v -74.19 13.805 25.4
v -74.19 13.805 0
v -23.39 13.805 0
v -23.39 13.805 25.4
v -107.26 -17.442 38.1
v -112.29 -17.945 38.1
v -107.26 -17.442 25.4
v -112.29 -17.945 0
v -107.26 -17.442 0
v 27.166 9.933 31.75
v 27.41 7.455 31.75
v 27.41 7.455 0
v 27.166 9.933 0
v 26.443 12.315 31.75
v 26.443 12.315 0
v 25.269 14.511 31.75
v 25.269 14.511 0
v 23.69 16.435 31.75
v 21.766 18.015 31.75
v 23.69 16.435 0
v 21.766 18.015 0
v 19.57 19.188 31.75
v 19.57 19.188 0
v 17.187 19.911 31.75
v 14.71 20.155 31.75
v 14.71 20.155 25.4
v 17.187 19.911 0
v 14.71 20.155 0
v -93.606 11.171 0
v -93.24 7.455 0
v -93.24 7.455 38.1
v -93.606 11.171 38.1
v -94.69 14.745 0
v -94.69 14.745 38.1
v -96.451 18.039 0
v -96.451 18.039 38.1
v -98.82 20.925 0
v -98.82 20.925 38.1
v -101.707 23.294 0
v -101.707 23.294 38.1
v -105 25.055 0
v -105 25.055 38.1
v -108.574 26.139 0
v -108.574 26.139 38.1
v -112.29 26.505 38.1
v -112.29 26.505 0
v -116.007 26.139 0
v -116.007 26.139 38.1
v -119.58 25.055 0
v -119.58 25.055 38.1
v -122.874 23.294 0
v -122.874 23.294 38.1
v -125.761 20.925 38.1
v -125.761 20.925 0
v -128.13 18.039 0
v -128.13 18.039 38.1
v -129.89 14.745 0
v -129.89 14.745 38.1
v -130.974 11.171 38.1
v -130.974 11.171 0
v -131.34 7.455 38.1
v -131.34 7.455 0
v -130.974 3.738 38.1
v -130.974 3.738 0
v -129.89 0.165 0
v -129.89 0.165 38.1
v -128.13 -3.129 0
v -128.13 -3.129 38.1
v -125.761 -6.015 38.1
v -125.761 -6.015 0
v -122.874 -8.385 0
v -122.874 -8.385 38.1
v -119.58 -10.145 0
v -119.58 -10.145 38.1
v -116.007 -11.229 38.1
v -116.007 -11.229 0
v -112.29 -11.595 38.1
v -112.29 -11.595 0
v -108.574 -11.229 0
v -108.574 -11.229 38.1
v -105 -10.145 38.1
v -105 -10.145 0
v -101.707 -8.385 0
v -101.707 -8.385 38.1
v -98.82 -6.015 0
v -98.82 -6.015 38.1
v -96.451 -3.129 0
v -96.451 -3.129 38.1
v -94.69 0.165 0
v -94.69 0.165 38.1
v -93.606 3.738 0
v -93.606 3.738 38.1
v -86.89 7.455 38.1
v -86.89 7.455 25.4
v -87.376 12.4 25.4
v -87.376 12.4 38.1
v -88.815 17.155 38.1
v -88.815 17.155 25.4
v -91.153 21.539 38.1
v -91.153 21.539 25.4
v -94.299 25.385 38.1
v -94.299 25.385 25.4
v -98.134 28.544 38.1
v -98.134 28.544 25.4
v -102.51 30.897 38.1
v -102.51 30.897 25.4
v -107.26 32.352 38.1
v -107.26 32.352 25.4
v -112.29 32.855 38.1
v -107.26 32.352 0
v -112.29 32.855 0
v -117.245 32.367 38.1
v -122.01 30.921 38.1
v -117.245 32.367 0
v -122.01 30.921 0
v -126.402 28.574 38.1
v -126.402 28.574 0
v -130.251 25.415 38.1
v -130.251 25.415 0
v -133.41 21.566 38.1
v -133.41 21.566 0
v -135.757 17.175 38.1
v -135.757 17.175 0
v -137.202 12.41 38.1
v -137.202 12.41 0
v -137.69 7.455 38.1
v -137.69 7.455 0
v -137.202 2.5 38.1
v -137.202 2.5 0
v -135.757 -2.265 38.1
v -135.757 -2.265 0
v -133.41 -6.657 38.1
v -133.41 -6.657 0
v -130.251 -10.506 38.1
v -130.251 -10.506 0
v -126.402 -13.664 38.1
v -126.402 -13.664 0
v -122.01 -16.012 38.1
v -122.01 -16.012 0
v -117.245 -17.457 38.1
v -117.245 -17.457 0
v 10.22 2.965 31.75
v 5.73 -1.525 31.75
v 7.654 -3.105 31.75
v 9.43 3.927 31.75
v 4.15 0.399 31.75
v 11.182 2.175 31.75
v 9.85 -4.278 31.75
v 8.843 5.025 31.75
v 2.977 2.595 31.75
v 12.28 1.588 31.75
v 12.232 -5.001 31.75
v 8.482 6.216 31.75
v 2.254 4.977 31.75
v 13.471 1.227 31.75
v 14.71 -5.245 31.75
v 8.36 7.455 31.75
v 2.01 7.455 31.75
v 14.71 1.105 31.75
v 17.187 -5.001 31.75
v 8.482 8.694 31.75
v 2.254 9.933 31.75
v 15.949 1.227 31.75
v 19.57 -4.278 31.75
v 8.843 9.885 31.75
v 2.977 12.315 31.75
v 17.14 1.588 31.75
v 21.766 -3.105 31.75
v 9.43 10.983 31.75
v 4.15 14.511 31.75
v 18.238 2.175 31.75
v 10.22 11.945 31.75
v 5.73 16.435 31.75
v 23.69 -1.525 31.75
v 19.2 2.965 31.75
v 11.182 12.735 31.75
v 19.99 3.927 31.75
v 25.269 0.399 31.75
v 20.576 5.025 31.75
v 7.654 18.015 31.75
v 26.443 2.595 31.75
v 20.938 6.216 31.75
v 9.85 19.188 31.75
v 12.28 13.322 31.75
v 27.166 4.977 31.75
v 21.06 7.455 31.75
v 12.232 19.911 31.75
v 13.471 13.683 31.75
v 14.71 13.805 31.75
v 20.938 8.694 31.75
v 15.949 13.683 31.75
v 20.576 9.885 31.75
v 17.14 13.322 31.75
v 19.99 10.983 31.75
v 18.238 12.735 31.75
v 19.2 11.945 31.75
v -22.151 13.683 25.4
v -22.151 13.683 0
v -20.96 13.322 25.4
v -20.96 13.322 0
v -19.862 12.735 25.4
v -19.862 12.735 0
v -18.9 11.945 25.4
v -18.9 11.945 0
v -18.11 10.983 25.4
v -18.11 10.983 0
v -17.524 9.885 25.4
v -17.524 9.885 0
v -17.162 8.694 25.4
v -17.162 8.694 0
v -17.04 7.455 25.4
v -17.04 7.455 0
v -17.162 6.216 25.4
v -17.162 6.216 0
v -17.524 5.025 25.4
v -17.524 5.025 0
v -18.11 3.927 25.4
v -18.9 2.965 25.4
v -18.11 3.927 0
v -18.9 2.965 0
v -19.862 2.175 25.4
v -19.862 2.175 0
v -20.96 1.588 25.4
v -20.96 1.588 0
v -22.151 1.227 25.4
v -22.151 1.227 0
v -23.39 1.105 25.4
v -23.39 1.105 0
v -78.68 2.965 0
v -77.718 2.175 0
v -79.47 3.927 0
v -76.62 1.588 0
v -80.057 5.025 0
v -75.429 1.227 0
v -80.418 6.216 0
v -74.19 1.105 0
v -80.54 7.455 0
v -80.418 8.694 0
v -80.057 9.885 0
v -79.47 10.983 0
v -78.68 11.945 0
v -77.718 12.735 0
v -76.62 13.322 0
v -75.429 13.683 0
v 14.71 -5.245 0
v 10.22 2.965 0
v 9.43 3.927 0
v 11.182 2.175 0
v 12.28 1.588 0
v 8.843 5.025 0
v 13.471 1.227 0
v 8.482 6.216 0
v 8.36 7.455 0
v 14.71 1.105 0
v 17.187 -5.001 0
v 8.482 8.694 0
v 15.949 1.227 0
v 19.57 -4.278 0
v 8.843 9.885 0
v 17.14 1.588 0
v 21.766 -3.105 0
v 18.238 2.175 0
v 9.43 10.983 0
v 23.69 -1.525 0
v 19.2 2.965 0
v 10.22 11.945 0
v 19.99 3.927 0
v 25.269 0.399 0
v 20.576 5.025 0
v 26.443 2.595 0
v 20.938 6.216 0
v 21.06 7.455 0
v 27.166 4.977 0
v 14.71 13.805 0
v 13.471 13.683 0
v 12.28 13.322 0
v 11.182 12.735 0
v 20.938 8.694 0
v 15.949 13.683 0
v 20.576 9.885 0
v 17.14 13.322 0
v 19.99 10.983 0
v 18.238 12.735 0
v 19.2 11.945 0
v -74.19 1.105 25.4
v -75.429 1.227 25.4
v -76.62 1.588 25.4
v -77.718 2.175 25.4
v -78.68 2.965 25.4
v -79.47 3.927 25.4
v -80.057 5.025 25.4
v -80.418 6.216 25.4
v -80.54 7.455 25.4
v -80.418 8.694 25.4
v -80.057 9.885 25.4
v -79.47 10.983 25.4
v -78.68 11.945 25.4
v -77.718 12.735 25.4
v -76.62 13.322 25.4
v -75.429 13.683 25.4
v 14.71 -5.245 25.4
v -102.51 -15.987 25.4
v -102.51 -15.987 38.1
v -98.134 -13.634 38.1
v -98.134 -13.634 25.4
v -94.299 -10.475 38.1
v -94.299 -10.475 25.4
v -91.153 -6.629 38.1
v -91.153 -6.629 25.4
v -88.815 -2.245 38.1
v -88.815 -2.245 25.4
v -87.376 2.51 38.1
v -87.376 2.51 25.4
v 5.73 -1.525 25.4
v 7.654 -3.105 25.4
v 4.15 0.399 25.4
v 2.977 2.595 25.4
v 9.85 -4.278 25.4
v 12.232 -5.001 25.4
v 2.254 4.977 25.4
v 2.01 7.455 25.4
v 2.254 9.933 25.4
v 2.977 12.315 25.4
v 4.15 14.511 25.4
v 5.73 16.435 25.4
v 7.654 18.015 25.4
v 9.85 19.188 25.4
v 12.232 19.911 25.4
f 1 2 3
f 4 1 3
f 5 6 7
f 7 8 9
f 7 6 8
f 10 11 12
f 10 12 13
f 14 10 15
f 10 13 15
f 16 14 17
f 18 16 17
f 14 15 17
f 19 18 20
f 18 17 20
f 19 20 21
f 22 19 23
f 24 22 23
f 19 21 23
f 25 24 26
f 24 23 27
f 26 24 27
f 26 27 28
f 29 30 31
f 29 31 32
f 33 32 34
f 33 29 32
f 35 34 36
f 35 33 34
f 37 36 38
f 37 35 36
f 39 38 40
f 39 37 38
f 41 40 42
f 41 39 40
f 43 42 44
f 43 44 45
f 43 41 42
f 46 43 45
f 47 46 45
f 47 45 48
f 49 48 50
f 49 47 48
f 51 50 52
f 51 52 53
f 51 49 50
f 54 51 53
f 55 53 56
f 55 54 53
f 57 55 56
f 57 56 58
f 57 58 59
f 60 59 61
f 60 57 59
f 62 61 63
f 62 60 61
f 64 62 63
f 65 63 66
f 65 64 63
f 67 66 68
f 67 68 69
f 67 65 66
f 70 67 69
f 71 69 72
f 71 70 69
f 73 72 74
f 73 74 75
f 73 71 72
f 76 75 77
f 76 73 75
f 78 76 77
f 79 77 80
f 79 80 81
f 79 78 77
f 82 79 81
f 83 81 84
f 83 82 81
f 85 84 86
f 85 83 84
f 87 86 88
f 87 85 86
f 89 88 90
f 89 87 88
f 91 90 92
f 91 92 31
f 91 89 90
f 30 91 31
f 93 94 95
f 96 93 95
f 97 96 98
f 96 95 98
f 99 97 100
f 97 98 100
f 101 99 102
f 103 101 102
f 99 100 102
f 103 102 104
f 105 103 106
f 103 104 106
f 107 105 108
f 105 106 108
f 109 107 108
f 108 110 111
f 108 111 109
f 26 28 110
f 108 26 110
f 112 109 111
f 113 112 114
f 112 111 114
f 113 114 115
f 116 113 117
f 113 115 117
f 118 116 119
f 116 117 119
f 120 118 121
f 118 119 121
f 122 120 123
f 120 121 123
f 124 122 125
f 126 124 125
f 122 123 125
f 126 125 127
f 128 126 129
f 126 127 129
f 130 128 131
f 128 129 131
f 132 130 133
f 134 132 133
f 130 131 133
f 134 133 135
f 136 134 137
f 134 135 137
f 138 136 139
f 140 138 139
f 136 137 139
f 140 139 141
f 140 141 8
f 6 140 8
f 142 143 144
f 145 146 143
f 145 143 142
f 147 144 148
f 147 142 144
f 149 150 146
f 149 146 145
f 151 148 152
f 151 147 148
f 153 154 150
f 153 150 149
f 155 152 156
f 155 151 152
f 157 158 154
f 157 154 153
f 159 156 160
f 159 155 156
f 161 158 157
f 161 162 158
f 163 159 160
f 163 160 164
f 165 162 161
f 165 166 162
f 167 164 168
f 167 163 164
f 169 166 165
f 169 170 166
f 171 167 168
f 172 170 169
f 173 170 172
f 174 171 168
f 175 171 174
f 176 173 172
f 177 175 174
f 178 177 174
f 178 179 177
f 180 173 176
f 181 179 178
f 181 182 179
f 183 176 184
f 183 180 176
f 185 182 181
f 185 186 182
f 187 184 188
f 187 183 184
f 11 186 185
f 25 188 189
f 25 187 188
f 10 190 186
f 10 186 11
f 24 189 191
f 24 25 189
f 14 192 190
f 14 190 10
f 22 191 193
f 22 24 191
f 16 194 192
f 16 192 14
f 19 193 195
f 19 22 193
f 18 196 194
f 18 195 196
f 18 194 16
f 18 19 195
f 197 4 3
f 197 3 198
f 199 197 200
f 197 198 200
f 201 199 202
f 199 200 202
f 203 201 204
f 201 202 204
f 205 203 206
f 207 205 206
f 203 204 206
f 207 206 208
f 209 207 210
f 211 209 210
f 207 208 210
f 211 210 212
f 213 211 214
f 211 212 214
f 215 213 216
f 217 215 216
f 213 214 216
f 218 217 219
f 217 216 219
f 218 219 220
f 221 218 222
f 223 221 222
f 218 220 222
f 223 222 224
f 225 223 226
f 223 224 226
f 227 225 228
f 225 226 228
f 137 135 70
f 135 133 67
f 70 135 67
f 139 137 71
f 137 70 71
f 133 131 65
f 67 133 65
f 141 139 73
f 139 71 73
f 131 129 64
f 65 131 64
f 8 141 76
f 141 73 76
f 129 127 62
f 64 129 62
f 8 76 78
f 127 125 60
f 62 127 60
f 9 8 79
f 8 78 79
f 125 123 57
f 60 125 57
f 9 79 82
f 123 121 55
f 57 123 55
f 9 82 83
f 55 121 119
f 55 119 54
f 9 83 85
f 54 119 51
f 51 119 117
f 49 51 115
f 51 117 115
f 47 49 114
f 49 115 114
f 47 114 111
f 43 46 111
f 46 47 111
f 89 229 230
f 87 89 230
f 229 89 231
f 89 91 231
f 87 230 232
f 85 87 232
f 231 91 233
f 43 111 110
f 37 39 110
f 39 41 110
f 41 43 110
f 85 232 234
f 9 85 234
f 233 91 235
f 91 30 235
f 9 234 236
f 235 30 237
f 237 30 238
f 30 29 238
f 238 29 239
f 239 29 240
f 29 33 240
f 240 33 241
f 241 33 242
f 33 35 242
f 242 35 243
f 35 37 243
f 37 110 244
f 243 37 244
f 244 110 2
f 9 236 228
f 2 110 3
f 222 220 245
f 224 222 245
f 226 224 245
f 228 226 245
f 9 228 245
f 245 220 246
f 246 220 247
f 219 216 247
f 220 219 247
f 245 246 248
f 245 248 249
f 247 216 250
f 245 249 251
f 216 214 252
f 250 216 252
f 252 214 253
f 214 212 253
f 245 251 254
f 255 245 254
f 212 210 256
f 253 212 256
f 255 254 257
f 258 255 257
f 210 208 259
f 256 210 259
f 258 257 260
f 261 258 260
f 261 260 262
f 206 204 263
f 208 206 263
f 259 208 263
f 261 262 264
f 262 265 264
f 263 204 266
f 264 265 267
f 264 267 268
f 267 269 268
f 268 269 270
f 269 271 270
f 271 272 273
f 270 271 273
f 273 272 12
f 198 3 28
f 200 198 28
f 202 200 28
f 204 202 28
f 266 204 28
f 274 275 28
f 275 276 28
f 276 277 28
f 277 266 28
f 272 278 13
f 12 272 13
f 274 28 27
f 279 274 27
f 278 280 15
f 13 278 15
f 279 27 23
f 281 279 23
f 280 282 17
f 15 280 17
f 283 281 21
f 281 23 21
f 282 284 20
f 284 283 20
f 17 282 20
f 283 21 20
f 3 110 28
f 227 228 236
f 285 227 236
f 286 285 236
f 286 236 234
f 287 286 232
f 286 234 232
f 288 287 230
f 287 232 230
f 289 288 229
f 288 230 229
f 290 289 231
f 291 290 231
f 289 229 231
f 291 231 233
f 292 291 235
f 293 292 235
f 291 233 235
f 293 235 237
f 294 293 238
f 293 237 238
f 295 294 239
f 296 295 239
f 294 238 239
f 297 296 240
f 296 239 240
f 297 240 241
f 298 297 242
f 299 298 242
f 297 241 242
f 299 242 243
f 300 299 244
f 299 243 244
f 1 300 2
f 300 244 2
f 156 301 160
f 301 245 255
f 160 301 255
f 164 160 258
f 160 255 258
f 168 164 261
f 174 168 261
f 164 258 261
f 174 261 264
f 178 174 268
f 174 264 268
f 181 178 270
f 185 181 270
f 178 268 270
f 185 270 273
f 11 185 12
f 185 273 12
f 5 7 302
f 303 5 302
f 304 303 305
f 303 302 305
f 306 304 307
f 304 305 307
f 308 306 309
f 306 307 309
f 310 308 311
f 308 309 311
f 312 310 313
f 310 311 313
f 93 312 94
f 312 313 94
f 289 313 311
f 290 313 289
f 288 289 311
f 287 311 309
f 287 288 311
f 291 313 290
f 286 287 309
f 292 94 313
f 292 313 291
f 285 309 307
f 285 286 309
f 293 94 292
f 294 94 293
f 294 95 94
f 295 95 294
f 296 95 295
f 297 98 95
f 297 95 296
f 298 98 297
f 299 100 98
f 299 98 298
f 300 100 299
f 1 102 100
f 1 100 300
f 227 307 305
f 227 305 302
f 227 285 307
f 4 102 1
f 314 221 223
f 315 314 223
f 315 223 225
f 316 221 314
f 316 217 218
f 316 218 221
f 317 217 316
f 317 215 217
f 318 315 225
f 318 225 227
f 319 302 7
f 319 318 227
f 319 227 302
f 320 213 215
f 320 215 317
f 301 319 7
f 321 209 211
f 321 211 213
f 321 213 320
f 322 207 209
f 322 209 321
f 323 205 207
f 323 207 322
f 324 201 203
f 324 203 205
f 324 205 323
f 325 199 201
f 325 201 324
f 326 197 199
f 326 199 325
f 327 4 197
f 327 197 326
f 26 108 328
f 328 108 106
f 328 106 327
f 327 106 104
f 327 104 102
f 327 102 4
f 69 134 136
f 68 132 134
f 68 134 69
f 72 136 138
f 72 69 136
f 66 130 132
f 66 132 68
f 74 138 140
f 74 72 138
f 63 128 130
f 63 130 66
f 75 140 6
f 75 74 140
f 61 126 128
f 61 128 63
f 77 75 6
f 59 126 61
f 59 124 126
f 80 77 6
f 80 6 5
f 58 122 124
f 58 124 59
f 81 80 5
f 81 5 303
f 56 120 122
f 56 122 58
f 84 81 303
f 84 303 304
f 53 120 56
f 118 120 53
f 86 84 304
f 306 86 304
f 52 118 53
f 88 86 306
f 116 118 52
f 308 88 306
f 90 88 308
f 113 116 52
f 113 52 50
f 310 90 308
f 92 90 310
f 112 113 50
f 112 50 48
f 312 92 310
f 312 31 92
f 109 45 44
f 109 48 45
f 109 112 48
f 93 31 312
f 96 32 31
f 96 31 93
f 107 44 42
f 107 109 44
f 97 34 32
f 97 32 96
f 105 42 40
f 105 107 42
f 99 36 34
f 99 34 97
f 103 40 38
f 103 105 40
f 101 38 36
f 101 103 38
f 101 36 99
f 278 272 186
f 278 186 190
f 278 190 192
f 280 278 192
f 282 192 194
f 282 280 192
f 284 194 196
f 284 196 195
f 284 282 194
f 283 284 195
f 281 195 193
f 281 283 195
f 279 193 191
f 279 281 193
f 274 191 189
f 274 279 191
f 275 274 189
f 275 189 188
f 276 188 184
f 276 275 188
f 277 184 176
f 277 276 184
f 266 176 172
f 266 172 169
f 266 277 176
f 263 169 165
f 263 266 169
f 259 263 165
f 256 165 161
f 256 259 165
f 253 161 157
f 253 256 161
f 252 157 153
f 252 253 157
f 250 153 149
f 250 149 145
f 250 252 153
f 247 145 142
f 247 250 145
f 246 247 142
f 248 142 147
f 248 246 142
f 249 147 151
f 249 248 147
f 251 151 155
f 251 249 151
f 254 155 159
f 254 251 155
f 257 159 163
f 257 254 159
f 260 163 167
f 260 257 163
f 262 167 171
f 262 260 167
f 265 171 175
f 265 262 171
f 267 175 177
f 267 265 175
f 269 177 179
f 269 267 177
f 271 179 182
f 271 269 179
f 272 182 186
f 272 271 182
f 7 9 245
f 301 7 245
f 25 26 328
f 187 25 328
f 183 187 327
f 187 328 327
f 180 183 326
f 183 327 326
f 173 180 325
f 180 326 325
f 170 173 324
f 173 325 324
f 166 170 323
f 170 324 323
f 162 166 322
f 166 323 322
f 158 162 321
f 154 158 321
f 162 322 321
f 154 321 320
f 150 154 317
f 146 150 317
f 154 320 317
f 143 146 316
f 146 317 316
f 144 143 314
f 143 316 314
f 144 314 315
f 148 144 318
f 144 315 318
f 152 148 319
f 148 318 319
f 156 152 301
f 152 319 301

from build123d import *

# Parameters (mm, degrees)
F0_R     = 19.05
F1_DEPTH = 38.1
F2_DEPTH = 25.4
F0_R_2   = 6.35
F3_DEPTH = 31.75


with BuildPart() as f1:
    # F0 (on Top) → F1 (new body)
    with BuildSketch(Plane.XY):
        with BuildLine():
            Line((-107.260471, 32.351975), (-112.290174, 32.854946))
            ThreePointArc((-112.290174, 32.854946), (-137.690174, 7.454946), (-112.290174, -17.945054))
            Line((-112.290174, -17.945054), (-107.260471, -17.442084))
            ThreePointArc((-107.260471, -17.442084), (-92.631658, -8.629294), (-86.890174, 7.454946))
            ThreePointArc((-86.890174, 7.454946), (-92.631658, 23.539186), (-107.260471, 32.351975))
        make_face()
        with Locations((-112.290174, 7.454946)):
            Circle(F0_R, mode=Mode.SUBTRACT)
    extrude(amount=F1_DEPTH)

    # F0 (on Top) → F2 (join)
    with BuildSketch(Plane.XY):
        with BuildLine():
            Line((14.709826, 20.154946), (-107.260471, 32.351975))
            ThreePointArc((-107.260471, 32.351975), (-92.631658, 23.539186), (-86.890174, 7.454946))
            ThreePointArc((-86.890174, 7.454946), (-92.631658, -8.629294), (-107.260471, -17.442084))
            Line((-107.260471, -17.442084), (14.709826, -5.245054))
            ThreePointArc((14.709826, -5.245054), (2.009826, 7.454946), (14.709826, 20.154946))
        make_face()
        with BuildLine():
            Line((-74.190174, 13.804946), (-23.390174, 13.804946))
            ThreePointArc((-23.390174, 13.804946), (-17.040174, 7.454946), (-23.390174, 1.104946))
            Line((-23.390174, 1.104946), (-74.190174, 1.104946))
            ThreePointArc((-74.190174, 1.104946), (-80.540174, 7.454946), (-74.190174, 13.804946))
        make_face(mode=Mode.SUBTRACT)
    extrude(amount=F2_DEPTH)

    # F0 (on Top) → F3 (join)
    with BuildSketch(Plane.XY):
        with BuildLine():
            ThreePointArc((27.409826, 7.454946), (23.690082, 16.435202), (14.709826, 20.154946))
            ThreePointArc((14.709826, 20.154946), (2.009826, 7.454946), (14.709826, -5.245054))
            ThreePointArc((14.709826, -5.245054), (23.690082, -1.52531), (27.409826, 7.454946))
        make_face()
        with Locations((14.709826, 7.454946)):
            Circle(F0_R_2, mode=Mode.SUBTRACT)
    extrude(amount=F3_DEPTH)


solid = f1.part
